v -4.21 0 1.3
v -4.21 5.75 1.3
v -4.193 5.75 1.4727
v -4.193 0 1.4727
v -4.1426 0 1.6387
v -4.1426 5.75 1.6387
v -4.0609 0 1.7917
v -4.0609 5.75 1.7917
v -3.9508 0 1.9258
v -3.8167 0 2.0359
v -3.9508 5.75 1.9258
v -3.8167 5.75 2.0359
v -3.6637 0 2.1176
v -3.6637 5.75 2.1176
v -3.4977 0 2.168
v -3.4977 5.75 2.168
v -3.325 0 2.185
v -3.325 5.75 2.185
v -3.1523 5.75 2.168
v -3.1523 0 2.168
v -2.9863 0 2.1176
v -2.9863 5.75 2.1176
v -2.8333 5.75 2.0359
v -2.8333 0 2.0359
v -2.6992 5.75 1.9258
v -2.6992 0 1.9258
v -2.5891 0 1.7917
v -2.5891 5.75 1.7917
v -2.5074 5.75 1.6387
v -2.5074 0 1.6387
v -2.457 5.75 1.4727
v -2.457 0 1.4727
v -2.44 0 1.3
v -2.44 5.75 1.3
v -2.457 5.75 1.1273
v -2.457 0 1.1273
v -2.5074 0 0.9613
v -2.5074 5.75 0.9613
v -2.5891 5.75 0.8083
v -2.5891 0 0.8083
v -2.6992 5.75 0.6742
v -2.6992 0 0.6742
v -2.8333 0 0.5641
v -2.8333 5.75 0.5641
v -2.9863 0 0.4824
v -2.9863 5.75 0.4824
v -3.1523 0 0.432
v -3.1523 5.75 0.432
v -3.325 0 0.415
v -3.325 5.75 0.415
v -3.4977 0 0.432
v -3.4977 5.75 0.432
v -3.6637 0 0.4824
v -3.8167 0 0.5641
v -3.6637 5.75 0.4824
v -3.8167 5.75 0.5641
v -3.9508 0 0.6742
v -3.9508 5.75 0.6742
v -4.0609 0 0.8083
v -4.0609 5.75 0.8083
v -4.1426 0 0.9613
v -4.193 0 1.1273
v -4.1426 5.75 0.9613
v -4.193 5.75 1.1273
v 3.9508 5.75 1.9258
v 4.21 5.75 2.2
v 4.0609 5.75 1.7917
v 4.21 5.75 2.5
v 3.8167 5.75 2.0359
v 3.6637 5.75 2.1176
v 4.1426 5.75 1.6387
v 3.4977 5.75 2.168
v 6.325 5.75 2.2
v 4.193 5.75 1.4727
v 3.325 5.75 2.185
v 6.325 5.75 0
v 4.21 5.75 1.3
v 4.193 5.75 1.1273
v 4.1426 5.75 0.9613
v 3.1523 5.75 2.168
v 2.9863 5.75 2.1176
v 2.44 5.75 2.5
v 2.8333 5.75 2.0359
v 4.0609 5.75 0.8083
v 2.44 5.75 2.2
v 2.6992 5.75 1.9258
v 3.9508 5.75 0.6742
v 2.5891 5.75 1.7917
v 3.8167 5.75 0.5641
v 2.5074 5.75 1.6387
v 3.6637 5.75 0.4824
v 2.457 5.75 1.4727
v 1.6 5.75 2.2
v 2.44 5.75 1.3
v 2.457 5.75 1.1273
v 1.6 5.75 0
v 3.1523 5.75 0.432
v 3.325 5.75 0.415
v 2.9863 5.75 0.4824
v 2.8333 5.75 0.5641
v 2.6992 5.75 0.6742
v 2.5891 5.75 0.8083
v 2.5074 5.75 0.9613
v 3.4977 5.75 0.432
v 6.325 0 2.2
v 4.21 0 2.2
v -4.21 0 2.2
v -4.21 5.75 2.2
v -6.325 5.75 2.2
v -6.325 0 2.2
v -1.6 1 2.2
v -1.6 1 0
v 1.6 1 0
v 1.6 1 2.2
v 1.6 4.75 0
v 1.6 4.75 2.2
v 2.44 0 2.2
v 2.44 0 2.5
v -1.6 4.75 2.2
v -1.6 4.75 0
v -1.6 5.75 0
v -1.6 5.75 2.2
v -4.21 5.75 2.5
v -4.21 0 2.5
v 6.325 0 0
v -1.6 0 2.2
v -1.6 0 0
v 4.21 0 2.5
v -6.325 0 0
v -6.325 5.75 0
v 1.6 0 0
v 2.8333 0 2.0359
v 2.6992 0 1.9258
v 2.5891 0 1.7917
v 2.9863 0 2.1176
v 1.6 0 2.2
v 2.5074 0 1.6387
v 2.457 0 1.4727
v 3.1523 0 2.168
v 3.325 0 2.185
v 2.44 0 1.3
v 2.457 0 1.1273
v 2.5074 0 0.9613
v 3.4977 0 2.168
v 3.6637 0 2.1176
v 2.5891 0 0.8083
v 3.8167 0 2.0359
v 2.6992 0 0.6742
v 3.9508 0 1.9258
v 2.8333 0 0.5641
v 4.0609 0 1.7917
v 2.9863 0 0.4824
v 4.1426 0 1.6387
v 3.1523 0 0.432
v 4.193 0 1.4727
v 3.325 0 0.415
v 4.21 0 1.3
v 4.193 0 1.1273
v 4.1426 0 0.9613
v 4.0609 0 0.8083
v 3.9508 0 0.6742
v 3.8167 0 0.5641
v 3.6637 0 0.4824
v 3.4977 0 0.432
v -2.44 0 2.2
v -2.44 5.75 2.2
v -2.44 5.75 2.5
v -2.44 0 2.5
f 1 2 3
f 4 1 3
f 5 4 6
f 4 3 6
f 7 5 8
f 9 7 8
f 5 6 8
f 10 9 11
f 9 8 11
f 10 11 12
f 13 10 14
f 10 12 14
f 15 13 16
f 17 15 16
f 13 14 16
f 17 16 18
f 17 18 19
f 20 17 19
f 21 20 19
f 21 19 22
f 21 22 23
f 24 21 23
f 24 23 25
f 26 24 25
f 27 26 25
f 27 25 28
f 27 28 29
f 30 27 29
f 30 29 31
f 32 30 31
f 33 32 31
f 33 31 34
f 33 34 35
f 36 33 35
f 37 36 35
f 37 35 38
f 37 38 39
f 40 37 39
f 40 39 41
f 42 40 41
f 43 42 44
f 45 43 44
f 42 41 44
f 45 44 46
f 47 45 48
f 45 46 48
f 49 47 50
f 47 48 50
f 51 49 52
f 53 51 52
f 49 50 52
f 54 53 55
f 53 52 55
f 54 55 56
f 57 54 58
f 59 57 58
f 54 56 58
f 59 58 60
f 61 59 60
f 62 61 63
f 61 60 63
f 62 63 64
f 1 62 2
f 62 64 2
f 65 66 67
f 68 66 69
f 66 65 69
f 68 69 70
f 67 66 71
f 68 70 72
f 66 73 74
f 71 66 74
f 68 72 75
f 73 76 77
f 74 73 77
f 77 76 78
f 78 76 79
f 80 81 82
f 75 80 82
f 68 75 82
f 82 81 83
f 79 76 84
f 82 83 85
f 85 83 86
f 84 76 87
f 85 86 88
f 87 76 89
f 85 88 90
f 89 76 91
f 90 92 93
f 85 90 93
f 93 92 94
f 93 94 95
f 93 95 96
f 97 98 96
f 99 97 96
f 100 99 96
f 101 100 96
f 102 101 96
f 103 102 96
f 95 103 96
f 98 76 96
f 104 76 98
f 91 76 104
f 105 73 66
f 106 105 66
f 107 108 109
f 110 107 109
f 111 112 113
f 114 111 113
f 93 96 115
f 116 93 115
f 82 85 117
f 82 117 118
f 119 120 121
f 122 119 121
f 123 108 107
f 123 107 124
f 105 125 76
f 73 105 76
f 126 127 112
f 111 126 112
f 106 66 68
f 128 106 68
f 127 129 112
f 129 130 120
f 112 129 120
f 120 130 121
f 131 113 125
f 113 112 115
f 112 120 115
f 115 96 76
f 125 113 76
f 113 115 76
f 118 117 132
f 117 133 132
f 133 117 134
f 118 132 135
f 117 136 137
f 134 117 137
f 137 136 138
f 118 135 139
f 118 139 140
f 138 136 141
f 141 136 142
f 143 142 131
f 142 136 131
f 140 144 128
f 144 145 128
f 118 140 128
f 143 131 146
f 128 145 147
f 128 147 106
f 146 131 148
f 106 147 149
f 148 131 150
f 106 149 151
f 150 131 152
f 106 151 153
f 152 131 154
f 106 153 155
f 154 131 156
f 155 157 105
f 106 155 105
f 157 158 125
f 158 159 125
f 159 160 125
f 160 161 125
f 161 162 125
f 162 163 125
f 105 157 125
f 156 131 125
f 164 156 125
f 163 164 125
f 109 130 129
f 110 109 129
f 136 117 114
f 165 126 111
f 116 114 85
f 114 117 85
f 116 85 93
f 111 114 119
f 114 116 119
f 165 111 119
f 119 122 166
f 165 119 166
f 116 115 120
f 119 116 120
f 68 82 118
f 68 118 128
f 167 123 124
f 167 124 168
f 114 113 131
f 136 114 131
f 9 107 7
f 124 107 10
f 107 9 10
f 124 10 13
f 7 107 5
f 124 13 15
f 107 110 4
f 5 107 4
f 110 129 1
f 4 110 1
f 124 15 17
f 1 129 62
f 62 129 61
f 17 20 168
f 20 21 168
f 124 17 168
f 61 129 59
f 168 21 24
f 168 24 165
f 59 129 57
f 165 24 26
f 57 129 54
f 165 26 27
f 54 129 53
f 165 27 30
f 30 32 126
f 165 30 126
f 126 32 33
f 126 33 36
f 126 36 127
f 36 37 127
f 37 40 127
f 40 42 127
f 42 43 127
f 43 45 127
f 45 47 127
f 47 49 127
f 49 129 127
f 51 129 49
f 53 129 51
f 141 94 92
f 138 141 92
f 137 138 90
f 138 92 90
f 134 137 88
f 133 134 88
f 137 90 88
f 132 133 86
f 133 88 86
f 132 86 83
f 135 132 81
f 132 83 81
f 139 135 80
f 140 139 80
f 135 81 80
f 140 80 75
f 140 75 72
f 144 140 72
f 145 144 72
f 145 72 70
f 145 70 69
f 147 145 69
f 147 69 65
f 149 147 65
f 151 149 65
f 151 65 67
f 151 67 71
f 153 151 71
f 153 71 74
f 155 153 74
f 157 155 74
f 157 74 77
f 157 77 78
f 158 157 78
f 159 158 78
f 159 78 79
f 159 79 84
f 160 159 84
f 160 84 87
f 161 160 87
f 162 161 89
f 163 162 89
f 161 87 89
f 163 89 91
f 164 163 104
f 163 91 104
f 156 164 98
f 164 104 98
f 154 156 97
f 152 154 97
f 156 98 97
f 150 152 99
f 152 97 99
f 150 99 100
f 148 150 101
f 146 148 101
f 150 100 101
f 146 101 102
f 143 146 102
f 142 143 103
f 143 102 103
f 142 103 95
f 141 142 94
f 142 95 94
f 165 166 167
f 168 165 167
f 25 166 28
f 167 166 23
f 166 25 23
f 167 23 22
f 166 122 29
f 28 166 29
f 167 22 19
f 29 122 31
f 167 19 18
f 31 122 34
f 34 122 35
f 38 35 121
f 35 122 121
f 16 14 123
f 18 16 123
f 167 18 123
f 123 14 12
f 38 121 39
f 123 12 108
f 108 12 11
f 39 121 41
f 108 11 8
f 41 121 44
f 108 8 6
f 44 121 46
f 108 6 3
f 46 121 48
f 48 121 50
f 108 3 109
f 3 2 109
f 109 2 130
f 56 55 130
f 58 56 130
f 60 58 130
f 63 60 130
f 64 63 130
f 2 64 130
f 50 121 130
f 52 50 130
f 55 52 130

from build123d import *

# Parameters (mm, degrees)
EXTRUDE1_DEPTH     = 2.5
CUT_EXTRUDE1_REACH = 7.75
SKETCH2_R          = 0.885
SKETCH2_W          = 4.04
SKETCH2_H          = 0.3
SKETCH2_W_2        = 0.84
SKETCH2_W_3        = 2.115


with BuildPart() as part:
    # Sketch1 → Extrude1 (new body)
    with BuildSketch(Plane.XY):
        Polygon((-1.6, 1), (1.6, 1), (1.6, 0), (6.325, 0), (6.325, 5.75), (1.6, 5.75), (1.6, 4.75), (-1.6, 4.75), (-1.6, 5.75), (-6.325, 5.75), (-6.325, 0), (-1.6, 0), align=None)
    extrude(amount=EXTRUDE1_DEPTH)

    # Sketch2 → Cut-Extrude1 (cut, up to next)
    with BuildSketch(Plane(origin=(0, 5.75, 0), x_dir=(-1, 0, 0), z_dir=(0, 1, 0)), mode=Mode.PRIVATE) as cut_extrude1_sk1:
        with Locations((3.325, 1.3)):
            Circle(SKETCH2_R)
    cut_extrude1_tool1 = extrude(cut_extrude1_sk1.sketch, amount=-CUT_EXTRUDE1_REACH, mode=Mode.PRIVATE) & part.part
    add(cut_extrude1_tool1.solids().sort_by_distance((-3.325, 5.75, 1.3))[0], mode=Mode.SUBTRACT)
    # Sketch2 → Cut-Extrude1 (cut, up to next)
    with BuildSketch(Plane(origin=(0, 5.75, 0), x_dir=(-1, 0, 0), z_dir=(0, 1, 0)), mode=Mode.PRIVATE) as cut_extrude1_sk2:
        with Locations((-3.325, 1.3)):
            Circle(SKETCH2_R)
    cut_extrude1_tool2 = extrude(cut_extrude1_sk2.sketch, amount=-CUT_EXTRUDE1_REACH, mode=Mode.PRIVATE) & part.part
    add(cut_extrude1_tool2.solids().sort_by_distance((3.325, 5.75, 1.3))[0], mode=Mode.SUBTRACT)
    # Sketch2 → Cut-Extrude1 (cut, up to next)
    with BuildSketch(Plane(origin=(0, 5.75, 0), x_dir=(-1, 0, 0), z_dir=(0, 1, 0)), mode=Mode.PRIVATE) as cut_extrude1_sk3:
        with Locations((-0.42, 2.35)):
            Rectangle(SKETCH2_W, SKETCH2_H)
    cut_extrude1_tool3 = extrude(cut_extrude1_sk3.sketch, amount=-CUT_EXTRUDE1_REACH, mode=Mode.PRIVATE) & part.part
    add(cut_extrude1_tool3.solids().sort_by_distance((0.42, 5.75, 2.35))[0], mode=Mode.SUBTRACT)
    # Sketch2 → Cut-Extrude1 (cut, up to next)
    with BuildSketch(Plane(origin=(0, 5.75, 0), x_dir=(-1, 0, 0), z_dir=(0, 1, 0)), mode=Mode.PRIVATE) as cut_extrude1_sk4:
        with Locations((2.02, 2.35)):
            Rectangle(SKETCH2_W_2, SKETCH2_H)
    cut_extrude1_tool4 = extrude(cut_extrude1_sk4.sketch, amount=-CUT_EXTRUDE1_REACH, mode=Mode.PRIVATE) & part.part
    add(cut_extrude1_tool4.solids().sort_by_distance((-2.02, 5.75, 2.35))[0], mode=Mode.SUBTRACT)
    # Sketch2 → Cut-Extrude1 (cut, up to next)
    with BuildSketch(Plane(origin=(0, 5.75, 0), x_dir=(-1, 0, 0), z_dir=(0, 1, 0)), mode=Mode.PRIVATE) as cut_extrude1_sk5:
        with Locations((-5.2675, 2.35)):
            Rectangle(SKETCH2_W_3, SKETCH2_H)
    cut_extrude1_tool5 = extrude(cut_extrude1_sk5.sketch, amount=-CUT_EXTRUDE1_REACH, mode=Mode.PRIVATE) & part.part
    add(cut_extrude1_tool5.solids().sort_by_distance((5.2675, 5.75, 2.35))[0], mode=Mode.SUBTRACT)
    # Sketch2 → Cut-Extrude1 (cut, up to next)
    with BuildSketch(Plane(origin=(0, 5.75, 0), x_dir=(-1, 0, 0), z_dir=(0, 1, 0)), mode=Mode.PRIVATE) as cut_extrude1_sk6:
        with Locations((5.2675, 2.35)):
            Rectangle(SKETCH2_W_3, SKETCH2_H)
    cut_extrude1_tool6 = extrude(cut_extrude1_sk6.sketch, amount=-CUT_EXTRUDE1_REACH, mode=Mode.PRIVATE) & part.part
    add(cut_extrude1_tool6.solids().sort_by_distance((-5.2675, 5.75, 2.35))[0], mode=Mode.SUBTRACT)


solid = part.part
